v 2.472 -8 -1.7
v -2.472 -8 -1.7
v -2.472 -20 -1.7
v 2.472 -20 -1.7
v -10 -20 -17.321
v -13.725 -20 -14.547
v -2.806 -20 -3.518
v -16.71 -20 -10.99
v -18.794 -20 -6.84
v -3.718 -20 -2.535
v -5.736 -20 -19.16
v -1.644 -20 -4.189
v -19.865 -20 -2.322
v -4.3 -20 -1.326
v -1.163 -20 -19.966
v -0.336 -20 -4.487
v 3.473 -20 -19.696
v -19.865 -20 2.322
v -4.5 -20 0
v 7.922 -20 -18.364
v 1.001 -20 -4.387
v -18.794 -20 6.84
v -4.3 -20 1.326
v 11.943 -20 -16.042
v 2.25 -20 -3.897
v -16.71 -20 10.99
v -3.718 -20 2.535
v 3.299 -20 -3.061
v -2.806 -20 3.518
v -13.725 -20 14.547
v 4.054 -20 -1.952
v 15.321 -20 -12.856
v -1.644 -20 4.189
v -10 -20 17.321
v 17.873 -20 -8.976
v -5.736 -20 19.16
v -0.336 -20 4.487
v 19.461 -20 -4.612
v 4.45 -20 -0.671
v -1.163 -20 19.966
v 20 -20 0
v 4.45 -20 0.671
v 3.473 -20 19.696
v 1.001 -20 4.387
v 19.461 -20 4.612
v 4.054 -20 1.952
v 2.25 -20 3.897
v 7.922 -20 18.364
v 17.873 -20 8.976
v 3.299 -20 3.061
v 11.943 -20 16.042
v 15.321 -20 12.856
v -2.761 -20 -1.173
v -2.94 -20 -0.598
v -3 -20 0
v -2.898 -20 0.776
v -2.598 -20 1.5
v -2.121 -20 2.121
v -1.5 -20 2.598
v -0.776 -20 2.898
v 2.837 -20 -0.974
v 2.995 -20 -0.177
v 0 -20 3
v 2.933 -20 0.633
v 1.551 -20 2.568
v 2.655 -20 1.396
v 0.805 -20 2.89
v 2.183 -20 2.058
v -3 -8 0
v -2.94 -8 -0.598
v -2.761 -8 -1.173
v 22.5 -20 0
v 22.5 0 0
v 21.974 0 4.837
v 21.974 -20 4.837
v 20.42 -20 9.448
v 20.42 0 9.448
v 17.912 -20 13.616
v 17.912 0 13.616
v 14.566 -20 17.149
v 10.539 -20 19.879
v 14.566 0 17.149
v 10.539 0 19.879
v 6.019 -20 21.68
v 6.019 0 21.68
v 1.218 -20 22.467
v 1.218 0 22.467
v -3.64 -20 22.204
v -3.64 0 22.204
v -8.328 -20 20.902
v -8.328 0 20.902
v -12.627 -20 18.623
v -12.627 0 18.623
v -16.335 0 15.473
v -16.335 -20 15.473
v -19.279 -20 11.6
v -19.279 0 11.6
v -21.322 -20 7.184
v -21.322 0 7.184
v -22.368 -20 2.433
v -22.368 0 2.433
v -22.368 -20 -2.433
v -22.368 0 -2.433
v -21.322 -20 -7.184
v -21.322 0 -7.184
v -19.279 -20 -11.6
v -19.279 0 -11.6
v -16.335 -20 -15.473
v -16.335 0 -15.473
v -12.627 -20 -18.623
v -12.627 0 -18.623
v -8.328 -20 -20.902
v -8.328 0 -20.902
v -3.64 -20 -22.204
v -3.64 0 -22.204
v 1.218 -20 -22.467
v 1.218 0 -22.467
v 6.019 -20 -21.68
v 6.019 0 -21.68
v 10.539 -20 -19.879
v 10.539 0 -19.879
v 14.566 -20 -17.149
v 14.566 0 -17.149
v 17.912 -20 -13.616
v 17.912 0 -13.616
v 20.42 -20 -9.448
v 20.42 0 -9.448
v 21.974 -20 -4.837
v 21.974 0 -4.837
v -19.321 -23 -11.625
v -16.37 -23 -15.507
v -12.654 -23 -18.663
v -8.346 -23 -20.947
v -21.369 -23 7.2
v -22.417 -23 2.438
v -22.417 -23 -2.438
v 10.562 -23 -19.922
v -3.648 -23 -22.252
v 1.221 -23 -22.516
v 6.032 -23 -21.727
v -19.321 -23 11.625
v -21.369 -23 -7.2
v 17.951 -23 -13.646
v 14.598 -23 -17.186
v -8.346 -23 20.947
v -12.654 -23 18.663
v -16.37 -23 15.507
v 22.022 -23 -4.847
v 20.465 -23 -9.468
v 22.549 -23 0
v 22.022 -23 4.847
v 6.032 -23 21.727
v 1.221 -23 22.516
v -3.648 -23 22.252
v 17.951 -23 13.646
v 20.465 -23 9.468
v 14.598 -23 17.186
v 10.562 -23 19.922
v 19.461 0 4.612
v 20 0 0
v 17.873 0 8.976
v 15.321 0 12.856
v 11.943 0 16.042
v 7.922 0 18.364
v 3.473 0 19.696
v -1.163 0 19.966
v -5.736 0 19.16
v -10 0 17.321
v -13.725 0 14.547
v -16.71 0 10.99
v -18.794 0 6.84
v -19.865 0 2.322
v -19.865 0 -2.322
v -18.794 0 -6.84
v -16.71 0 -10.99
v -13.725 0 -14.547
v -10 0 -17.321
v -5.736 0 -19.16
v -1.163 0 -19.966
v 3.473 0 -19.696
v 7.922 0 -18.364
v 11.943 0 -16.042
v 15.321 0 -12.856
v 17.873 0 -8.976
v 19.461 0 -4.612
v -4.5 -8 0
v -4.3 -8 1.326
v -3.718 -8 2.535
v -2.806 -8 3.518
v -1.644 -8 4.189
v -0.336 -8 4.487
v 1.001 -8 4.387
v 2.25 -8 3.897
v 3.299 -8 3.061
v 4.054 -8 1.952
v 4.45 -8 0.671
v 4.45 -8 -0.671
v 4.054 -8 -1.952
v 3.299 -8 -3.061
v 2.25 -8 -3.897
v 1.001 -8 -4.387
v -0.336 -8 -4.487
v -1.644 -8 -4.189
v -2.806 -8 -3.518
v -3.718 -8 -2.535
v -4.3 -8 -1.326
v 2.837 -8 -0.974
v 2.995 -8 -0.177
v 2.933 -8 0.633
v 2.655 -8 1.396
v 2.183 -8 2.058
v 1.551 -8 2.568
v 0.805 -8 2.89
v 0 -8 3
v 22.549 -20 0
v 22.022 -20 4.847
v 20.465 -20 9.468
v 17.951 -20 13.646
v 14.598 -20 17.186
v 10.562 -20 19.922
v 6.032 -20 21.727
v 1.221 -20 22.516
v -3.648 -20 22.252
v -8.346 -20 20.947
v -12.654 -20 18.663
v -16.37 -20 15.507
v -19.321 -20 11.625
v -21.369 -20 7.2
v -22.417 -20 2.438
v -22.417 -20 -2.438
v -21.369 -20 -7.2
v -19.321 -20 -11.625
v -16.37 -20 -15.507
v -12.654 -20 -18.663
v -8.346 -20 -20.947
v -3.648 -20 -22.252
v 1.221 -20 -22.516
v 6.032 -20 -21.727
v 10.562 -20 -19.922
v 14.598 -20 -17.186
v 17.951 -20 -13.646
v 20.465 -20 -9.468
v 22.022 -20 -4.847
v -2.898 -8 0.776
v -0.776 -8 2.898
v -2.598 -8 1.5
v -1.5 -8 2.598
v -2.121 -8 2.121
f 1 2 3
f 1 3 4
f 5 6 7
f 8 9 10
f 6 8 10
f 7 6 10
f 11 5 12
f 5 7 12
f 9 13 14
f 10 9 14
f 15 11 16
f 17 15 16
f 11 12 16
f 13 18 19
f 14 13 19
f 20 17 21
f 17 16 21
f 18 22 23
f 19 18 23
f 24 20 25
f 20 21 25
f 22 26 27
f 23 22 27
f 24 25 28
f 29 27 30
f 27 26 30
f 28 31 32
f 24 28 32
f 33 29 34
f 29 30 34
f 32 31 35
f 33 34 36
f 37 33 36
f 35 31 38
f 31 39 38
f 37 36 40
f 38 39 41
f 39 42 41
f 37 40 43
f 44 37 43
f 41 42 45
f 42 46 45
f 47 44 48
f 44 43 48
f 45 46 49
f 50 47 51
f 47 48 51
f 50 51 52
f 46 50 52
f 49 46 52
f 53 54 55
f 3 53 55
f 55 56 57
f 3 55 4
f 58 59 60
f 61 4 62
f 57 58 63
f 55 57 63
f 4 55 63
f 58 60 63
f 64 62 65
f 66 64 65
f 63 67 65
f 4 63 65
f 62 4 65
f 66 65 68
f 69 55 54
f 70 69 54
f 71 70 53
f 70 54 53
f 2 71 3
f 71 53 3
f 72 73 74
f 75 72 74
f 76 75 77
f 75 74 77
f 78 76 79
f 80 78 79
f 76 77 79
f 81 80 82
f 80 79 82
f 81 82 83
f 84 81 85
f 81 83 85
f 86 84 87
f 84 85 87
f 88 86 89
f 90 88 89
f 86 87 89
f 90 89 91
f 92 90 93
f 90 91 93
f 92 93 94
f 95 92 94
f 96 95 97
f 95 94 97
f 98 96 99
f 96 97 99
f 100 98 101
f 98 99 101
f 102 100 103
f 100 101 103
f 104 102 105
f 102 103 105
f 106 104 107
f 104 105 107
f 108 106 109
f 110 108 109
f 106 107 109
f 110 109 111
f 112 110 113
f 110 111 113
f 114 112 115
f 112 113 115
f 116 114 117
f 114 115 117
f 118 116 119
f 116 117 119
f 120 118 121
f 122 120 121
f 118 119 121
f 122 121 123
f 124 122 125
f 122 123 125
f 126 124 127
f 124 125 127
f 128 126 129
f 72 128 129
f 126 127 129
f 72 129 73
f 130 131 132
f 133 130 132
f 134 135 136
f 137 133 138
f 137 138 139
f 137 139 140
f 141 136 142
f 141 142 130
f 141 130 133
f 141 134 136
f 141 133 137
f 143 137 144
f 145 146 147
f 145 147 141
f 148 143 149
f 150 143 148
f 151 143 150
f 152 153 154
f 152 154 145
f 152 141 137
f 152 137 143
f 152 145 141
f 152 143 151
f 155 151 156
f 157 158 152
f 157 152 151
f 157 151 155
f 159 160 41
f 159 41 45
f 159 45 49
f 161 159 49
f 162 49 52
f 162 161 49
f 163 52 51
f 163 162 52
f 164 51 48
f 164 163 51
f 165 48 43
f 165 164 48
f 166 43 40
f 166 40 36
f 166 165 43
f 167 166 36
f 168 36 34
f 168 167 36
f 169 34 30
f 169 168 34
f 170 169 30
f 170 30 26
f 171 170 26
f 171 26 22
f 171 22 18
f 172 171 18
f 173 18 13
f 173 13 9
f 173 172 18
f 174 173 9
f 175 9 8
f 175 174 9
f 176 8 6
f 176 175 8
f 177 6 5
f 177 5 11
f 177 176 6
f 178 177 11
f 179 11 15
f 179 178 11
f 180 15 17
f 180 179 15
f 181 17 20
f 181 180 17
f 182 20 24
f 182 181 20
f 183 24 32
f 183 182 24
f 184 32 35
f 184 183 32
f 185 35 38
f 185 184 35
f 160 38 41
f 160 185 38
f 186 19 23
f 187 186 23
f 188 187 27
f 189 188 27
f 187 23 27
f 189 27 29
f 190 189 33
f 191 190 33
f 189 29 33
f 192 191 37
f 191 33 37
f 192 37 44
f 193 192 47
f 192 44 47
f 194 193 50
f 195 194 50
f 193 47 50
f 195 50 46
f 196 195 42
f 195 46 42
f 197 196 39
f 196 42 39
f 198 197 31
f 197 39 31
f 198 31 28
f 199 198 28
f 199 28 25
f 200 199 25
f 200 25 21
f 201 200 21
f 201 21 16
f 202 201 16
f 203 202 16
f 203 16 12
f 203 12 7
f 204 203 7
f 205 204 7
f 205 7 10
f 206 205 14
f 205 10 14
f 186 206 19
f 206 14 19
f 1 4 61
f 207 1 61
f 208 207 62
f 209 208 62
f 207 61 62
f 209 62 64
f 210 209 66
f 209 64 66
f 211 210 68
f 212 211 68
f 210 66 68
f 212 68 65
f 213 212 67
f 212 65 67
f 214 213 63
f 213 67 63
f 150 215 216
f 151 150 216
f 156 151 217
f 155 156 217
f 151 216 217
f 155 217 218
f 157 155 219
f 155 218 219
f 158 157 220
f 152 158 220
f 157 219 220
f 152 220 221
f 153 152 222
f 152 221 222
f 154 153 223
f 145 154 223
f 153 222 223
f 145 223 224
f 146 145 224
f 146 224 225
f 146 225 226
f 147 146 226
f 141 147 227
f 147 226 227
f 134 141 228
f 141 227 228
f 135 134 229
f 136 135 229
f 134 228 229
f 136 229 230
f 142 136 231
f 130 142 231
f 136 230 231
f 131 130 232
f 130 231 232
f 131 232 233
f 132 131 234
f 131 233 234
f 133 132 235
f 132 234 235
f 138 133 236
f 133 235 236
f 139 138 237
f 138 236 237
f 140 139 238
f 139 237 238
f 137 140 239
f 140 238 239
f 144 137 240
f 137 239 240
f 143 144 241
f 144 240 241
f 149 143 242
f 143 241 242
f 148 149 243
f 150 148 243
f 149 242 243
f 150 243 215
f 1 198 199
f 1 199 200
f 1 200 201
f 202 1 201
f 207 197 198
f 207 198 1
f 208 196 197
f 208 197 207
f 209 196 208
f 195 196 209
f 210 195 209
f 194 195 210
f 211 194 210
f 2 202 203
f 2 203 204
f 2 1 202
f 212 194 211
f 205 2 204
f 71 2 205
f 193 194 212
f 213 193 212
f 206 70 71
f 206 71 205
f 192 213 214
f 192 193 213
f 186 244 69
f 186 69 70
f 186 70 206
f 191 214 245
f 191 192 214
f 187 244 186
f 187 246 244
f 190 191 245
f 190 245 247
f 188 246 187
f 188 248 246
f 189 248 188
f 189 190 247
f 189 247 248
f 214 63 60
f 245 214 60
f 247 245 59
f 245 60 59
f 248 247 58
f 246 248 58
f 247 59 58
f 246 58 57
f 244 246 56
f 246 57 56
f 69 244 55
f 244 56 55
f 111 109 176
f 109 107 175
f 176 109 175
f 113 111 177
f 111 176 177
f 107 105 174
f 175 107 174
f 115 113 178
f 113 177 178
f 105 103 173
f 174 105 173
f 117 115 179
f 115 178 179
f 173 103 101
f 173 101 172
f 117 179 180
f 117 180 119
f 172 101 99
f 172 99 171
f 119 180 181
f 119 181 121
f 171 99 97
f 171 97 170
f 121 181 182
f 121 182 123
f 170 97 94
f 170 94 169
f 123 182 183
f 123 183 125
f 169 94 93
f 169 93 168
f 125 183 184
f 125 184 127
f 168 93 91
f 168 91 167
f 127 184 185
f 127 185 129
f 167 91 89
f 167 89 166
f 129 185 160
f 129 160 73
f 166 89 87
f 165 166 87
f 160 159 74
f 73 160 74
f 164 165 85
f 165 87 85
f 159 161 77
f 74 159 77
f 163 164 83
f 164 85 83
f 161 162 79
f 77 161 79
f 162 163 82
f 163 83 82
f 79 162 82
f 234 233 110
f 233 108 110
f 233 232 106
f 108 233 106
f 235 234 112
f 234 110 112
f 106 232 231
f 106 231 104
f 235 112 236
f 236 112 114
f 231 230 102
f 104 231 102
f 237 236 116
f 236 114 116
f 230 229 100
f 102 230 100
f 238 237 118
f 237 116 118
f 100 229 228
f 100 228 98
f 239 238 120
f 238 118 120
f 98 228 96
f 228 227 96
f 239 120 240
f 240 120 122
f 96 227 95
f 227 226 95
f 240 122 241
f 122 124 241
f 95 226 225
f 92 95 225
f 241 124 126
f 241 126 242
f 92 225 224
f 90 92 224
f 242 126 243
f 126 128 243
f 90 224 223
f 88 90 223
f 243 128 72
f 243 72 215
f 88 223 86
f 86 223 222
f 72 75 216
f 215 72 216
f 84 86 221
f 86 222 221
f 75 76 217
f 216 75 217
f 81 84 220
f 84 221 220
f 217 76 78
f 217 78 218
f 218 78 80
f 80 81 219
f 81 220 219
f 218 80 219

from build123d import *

# Parameters (mm, degrees)
F0_R     = 22.5
F0_R_2   = 20
F1_DEPTH = 20
F2_R     = 22.5489054278
F3_DEPTH = 3
F4_R     = 4.5
F5_DEPTH = 12


with BuildPart() as f1:
    # F0 (on Front) → F1 (new body)
    with BuildSketch(Plane.XZ):
        Circle(F0_R)
        Circle(F0_R_2, mode=Mode.SUBTRACT)
    extrude(amount=F1_DEPTH)

    # F2 (on face) → F3 (join)
    with BuildSketch(Plane.XZ.offset(20)):
        Circle(F2_R)
    extrude(amount=F3_DEPTH)

    # F4 (on face) → F5 (join)
    with BuildSketch(Plane(origin=(0, -20, 0), x_dir=(-1, 0, 0), z_dir=(0, 1, 0))):
        Circle(F4_R)
        with BuildLine():
            ThreePointArc((0, 3), (2.1213203436, 2.1213203436), (3, 0))
            ThreePointArc((3, 0), (2.8649192185, -0.8900774526), (2.4718414189, -1.7))
            ThreePointArc((2.4718414189, -1.7), (0, -3), (-2.4718414189, -1.7))
            ThreePointArc((-2.4718414189, -1.7), (-2.6551836095, 1.3964240044), (0, 3))
        make_face(mode=Mode.SUBTRACT)
        with BuildLine():
            ThreePointArc((-2.4718414189, -1.7), (0, -3), (2.4718414189, -1.7))
            Line((2.4718414189, -1.7), (0, -1.7))
            Line((0, -1.7), (-2.4718414189, -1.7))
        make_face()
    extrude(amount=F5_DEPTH)


solid = f1.part
